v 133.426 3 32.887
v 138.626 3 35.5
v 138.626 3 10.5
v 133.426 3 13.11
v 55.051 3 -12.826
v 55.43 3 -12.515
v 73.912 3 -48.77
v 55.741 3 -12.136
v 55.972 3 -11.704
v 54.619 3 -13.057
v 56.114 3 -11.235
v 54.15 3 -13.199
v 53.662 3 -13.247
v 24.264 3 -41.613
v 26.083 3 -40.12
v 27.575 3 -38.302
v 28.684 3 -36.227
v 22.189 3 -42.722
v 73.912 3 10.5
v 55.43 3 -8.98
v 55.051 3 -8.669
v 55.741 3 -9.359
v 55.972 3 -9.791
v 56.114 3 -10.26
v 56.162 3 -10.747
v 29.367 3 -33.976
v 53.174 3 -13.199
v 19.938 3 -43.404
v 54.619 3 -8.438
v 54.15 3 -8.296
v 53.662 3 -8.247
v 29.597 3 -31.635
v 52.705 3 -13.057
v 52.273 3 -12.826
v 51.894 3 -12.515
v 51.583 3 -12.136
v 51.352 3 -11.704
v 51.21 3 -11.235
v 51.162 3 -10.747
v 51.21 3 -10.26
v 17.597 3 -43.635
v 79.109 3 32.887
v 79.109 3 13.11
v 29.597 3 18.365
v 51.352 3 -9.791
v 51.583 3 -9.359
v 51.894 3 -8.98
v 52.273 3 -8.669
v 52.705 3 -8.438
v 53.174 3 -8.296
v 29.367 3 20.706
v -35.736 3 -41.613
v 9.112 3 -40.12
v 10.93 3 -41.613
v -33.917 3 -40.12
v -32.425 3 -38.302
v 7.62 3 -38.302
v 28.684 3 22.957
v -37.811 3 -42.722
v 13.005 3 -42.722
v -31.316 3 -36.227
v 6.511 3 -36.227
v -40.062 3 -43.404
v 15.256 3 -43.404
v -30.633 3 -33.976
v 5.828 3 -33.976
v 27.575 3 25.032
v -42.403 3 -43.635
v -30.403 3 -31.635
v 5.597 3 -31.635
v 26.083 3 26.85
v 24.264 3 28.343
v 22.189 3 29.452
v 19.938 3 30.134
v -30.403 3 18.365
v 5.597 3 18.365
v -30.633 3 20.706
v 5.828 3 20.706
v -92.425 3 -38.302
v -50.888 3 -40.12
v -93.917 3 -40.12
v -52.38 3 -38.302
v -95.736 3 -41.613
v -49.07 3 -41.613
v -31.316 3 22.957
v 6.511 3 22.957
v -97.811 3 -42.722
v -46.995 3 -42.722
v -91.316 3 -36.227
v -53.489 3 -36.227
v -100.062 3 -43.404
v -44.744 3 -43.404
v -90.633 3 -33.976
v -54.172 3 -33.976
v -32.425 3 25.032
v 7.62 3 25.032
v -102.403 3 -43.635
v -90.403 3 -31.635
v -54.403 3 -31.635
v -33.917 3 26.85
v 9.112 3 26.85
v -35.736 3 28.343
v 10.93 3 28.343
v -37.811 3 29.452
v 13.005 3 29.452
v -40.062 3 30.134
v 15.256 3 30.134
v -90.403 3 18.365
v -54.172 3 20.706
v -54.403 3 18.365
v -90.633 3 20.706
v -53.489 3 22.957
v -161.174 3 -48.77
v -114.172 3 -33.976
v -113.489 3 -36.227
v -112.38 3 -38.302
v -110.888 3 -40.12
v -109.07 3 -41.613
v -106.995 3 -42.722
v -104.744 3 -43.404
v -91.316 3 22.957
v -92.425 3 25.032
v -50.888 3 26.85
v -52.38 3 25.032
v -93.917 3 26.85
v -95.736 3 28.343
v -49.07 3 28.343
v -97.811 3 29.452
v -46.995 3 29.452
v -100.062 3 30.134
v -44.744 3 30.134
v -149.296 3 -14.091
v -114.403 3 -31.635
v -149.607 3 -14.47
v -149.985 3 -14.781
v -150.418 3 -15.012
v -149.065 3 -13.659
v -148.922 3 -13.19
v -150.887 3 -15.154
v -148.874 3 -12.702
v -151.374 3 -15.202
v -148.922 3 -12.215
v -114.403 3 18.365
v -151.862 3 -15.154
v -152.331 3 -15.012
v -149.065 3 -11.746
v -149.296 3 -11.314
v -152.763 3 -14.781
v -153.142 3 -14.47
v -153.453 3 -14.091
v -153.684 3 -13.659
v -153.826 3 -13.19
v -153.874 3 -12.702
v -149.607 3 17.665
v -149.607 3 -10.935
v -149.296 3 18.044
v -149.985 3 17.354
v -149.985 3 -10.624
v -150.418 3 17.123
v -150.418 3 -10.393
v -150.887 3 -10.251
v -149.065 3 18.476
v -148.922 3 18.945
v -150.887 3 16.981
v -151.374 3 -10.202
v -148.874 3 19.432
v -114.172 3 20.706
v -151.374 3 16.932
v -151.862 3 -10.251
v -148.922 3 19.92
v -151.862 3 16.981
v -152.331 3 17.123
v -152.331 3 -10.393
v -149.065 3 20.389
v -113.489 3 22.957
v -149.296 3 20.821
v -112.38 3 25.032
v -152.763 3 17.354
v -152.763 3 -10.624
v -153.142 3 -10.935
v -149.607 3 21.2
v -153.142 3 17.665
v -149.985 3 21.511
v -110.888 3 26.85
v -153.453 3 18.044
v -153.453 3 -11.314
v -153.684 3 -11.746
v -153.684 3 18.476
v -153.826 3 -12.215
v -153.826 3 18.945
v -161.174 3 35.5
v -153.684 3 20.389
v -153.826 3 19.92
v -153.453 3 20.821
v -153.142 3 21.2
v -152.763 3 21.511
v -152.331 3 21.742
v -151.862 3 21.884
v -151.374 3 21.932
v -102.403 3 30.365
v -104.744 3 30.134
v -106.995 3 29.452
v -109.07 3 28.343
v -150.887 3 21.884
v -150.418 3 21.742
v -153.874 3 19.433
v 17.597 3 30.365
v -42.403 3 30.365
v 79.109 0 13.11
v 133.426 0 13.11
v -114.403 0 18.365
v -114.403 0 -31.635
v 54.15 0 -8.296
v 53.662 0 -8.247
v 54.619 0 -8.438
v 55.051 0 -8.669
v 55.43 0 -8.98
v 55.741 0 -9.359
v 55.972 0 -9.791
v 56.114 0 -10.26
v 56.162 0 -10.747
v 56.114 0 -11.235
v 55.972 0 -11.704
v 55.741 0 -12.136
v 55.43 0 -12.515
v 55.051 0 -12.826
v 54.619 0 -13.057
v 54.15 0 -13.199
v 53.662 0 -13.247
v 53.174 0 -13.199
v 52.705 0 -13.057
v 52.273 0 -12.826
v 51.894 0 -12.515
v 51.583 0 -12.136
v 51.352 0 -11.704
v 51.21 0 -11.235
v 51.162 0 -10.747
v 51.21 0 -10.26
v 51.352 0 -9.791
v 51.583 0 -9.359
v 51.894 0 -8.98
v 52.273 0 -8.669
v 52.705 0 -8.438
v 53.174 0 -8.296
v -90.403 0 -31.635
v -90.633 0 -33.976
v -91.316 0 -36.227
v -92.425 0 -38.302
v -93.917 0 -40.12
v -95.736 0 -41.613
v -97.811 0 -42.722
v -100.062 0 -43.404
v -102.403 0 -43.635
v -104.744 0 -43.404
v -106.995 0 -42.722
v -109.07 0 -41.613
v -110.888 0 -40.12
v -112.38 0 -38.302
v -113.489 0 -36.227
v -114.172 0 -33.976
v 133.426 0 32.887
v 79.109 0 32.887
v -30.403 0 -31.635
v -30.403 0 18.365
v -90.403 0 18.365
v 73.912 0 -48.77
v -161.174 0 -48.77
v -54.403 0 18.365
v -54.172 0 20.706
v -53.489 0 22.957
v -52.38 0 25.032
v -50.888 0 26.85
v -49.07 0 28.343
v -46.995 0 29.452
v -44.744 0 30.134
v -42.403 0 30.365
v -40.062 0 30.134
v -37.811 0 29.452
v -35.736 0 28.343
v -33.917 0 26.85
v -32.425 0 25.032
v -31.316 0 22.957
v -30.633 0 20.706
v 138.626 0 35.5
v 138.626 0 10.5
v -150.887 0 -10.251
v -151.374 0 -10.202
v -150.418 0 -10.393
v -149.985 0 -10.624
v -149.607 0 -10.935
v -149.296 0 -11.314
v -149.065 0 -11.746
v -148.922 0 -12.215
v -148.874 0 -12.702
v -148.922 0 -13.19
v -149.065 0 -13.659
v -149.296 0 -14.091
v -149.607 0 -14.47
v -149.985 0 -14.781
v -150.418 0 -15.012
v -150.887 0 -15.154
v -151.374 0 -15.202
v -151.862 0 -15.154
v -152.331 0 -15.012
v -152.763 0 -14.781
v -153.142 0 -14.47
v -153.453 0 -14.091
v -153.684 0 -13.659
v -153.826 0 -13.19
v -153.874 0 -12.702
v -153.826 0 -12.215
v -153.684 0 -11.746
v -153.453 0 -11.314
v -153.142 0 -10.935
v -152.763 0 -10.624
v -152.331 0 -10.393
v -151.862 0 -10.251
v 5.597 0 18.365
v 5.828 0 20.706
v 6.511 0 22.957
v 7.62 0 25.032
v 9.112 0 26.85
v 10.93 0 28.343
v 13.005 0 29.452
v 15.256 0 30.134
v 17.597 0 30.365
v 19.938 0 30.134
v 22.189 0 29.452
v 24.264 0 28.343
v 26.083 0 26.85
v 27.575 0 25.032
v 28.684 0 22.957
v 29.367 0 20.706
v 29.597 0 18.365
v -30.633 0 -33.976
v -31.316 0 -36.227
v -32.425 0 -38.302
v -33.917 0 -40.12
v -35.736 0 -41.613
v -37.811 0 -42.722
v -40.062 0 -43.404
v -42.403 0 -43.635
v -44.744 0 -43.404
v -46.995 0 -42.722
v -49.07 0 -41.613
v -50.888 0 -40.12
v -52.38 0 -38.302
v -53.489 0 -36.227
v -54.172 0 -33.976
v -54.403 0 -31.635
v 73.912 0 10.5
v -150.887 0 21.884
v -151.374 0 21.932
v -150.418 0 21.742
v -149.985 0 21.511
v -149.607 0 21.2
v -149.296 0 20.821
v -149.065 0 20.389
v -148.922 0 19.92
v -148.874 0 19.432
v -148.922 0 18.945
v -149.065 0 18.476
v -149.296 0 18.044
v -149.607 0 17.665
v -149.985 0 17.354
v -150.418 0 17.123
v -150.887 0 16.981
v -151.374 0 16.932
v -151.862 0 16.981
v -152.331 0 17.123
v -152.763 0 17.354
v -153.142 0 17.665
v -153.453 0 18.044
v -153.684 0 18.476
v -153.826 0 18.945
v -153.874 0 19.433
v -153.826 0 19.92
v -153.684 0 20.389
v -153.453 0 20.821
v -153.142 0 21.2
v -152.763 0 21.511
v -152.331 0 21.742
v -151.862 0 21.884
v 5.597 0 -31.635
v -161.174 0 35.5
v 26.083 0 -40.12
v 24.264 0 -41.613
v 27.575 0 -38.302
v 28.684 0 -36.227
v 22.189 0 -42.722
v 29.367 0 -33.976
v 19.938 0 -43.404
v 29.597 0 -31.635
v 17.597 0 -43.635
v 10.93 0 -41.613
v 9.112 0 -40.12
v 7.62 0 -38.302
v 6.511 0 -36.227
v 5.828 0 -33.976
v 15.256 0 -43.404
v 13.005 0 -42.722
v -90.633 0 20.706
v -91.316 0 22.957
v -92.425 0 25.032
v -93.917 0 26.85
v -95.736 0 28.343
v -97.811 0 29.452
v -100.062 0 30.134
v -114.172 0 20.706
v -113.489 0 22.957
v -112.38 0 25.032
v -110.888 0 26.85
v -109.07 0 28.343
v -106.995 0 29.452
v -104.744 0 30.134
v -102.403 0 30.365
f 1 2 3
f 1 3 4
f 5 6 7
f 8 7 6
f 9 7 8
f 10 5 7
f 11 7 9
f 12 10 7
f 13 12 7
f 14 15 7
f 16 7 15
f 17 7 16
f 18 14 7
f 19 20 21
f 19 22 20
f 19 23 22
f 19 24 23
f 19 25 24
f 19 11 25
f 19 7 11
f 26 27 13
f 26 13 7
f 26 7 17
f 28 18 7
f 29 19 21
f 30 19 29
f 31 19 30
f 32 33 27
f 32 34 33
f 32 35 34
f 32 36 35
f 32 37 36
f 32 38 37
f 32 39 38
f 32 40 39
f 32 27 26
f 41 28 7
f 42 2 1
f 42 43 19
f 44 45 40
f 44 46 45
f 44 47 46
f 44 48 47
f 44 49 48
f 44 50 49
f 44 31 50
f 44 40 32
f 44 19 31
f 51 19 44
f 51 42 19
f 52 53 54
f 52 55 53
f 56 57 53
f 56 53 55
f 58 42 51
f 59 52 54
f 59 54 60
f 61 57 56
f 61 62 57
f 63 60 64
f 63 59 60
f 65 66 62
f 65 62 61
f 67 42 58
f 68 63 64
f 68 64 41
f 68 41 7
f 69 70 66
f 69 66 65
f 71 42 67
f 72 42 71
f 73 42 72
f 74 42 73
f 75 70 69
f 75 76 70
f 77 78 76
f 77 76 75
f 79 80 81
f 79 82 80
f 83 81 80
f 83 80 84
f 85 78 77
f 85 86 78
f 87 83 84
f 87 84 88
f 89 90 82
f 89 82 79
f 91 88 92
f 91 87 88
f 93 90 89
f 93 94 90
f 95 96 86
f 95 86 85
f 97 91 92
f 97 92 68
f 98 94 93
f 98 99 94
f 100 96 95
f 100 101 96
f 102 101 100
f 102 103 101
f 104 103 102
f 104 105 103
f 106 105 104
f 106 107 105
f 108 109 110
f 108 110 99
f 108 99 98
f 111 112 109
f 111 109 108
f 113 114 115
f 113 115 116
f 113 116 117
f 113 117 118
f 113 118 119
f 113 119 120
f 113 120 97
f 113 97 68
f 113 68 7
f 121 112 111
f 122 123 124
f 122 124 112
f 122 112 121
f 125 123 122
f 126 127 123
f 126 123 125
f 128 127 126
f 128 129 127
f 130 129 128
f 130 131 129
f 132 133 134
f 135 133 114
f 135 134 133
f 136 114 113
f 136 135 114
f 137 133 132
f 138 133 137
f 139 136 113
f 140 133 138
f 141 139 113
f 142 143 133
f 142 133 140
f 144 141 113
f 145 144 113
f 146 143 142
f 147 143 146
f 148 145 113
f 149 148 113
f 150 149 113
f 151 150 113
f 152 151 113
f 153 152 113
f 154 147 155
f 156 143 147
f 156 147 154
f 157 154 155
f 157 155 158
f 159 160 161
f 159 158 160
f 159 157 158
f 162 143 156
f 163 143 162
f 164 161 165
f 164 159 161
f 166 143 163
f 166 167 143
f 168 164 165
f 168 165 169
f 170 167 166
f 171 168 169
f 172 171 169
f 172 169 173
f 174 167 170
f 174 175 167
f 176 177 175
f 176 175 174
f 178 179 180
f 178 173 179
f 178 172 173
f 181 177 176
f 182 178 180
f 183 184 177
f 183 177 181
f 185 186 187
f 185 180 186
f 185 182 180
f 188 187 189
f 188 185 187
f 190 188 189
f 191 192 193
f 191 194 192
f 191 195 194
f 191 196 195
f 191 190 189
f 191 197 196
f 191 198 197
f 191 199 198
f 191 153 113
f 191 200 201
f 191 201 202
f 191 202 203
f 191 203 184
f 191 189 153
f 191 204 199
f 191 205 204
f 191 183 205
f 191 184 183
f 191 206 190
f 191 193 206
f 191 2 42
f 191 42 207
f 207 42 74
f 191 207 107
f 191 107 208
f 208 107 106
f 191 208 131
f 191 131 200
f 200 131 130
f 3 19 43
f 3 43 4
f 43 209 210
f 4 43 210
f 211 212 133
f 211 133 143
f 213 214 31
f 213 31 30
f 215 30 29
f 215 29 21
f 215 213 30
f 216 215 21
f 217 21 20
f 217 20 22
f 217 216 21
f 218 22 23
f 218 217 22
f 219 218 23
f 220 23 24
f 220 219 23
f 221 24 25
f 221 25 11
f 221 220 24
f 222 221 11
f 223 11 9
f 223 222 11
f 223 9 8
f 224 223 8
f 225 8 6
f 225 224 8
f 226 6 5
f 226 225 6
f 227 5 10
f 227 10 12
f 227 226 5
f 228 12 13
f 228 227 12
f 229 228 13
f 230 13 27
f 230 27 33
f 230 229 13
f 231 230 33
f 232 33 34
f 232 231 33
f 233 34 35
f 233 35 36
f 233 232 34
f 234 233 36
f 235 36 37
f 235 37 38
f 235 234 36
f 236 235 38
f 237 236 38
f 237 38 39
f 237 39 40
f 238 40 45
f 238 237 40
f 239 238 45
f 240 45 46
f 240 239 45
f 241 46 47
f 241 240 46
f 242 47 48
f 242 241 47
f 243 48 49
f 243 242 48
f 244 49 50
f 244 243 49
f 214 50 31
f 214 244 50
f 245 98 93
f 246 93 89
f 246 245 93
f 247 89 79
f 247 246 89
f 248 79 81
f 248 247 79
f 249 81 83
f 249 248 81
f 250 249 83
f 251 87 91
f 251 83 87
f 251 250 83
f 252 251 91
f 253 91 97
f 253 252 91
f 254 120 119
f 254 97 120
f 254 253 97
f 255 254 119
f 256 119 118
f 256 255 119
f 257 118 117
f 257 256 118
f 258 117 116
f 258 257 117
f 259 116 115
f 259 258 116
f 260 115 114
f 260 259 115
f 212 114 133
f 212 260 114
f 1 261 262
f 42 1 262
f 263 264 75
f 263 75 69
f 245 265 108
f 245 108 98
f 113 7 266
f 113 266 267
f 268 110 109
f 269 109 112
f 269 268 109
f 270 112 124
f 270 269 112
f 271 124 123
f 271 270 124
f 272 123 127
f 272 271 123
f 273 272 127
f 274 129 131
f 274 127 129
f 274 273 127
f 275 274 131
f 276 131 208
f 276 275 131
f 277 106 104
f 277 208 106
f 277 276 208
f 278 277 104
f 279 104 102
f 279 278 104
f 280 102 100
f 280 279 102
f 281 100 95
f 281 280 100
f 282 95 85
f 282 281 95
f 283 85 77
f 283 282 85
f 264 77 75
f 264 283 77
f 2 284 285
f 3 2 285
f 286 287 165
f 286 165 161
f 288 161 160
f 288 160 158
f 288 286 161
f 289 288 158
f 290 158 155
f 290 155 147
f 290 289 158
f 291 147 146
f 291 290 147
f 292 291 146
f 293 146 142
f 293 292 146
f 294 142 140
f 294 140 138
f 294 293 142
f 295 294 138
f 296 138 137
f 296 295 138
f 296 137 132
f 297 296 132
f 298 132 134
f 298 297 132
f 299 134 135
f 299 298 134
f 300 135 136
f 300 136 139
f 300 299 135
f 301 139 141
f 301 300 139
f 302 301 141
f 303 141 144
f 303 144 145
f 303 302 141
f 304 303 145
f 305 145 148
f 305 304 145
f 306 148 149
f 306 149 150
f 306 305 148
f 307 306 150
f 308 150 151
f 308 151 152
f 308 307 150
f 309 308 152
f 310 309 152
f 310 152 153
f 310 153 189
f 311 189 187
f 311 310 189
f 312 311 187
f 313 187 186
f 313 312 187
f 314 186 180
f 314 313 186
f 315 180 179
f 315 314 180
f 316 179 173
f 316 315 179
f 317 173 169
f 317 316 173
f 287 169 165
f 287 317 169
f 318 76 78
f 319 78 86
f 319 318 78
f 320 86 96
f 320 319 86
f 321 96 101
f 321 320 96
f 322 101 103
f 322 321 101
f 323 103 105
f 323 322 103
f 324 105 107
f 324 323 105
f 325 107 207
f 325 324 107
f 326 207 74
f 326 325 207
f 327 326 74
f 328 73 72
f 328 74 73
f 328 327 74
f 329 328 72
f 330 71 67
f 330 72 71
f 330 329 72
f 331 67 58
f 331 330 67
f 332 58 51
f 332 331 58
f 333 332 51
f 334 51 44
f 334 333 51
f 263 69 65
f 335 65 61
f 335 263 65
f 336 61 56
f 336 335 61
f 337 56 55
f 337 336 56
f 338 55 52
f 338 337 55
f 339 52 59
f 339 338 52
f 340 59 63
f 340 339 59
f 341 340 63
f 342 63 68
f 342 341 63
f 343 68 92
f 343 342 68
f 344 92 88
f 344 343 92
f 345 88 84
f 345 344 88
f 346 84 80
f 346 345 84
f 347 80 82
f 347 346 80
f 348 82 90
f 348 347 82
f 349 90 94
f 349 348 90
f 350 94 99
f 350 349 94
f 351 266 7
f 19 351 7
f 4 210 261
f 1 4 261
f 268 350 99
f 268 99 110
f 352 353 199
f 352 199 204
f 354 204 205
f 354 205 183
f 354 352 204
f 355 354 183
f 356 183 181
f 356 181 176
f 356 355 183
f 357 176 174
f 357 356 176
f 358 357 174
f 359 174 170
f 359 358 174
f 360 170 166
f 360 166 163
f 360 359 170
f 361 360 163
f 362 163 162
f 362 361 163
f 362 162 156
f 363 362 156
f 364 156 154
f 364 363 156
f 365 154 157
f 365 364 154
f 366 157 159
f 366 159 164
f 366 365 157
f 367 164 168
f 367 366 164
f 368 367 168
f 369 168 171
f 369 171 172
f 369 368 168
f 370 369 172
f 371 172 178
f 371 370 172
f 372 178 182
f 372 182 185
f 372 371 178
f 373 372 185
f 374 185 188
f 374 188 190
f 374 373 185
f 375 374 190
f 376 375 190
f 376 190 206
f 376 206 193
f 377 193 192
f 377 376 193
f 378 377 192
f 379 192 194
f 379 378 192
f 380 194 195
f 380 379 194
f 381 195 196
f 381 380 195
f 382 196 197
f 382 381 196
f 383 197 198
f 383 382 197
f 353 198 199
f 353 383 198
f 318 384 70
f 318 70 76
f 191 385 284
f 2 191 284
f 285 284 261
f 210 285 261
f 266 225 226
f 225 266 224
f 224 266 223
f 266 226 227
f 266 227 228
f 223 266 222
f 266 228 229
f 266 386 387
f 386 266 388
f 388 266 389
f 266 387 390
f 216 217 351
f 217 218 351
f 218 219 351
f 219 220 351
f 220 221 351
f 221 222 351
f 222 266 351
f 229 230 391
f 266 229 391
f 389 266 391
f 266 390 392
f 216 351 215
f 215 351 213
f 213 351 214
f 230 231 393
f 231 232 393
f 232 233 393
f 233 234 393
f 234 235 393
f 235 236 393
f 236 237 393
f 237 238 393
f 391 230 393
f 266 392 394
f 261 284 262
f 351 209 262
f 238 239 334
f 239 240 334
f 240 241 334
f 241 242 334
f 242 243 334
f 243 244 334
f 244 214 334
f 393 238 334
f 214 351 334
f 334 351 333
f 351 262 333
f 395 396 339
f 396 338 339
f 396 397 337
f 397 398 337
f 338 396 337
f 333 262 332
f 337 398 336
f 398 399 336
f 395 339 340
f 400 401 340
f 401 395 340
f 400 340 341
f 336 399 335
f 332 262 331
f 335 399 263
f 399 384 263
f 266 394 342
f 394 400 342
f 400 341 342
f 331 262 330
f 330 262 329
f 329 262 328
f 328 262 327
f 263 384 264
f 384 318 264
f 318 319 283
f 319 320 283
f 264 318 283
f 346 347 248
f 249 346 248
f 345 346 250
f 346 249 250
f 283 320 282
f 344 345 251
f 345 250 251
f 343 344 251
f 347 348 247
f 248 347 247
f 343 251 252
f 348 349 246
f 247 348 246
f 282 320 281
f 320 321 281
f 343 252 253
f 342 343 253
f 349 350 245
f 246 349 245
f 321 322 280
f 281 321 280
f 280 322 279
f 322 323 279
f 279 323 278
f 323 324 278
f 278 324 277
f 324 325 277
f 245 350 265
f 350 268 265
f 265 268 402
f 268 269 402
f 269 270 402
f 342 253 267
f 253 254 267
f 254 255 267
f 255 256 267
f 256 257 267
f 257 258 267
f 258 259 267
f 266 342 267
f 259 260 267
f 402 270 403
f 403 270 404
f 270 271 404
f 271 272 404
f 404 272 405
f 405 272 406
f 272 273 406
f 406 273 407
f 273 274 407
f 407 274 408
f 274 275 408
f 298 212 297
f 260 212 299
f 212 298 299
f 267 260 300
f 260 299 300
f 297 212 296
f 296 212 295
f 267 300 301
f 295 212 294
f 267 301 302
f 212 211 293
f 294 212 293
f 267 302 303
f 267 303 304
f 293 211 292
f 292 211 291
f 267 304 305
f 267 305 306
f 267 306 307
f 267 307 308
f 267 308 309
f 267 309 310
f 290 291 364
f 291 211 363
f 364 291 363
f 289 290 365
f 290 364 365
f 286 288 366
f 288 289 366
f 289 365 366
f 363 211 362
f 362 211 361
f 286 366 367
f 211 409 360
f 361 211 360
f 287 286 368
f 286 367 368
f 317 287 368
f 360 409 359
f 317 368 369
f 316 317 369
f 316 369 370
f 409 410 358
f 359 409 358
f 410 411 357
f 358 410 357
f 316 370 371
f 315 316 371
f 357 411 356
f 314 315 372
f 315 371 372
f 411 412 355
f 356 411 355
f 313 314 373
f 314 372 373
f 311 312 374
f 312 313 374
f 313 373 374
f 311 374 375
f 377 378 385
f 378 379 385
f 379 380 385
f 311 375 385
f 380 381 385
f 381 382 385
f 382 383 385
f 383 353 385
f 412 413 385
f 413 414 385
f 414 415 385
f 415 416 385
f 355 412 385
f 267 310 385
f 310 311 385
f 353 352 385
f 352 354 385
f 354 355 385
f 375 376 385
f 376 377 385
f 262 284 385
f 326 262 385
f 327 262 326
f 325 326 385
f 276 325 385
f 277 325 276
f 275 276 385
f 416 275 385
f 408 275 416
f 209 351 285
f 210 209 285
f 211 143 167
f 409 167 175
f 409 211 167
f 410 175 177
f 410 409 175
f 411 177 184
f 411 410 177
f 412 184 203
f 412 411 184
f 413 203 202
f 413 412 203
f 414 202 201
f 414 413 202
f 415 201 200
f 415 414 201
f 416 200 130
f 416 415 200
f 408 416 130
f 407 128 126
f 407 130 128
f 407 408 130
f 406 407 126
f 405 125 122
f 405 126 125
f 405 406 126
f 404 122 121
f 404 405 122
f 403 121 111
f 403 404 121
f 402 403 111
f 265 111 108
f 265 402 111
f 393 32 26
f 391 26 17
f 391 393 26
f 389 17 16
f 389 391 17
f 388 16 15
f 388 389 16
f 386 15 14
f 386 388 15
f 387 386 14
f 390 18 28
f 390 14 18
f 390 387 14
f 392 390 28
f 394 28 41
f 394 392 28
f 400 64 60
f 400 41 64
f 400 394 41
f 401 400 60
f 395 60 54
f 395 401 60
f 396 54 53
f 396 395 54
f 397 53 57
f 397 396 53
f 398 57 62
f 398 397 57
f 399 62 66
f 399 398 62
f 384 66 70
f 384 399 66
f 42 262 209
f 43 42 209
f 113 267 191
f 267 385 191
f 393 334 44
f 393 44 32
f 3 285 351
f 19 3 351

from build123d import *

# Parameters (mm, degrees)
ESQUISSE1_R             = 2.5
BOSS_EXTRU_1_DEPTH      = 3
ENL_V_MAT_EXTRU_1_DEPTH = 166.064843505
SKETCH1_W               = 235.08624341
SKETCH1_H               = 3
BOSS_EXTRUDE1_DEPTH     = 20
SKETCH2_W               = 54.316544192
SKETCH2_H               = 19.777044638
CUT_EXTRUDE1_DEPTH      = 10
CUT_EXTRUDE2_DEPTH      = 10


with BuildPart() as part:
    # Esquisse1 → Boss.-Extru.1 (new body)
    with BuildSketch(Plane(origin=(0, 0, 0), x_dir=(1, 0, 0), z_dir=(0, 1, 0))):
        Polygon((-161.174292495, 18.77), (-161.174292495, -25.5), (-161.174292495, -35.5), (138.625707505, -35.5), (138.625707505, -10.5), (73.911950915, -10.5), (73.911950915, 28.77), (-161.174292495, 28.77), align=None)
        with Locations(Location((-151.374292495, -19.4325, 0), (0, 0, 270))):
            Circle(ESQUISSE1_R, mode=Mode.SUBTRACT)
        with Locations(Location((-151.374292495, 12.7025, 0), (0, 0, 270))):
            Circle(ESQUISSE1_R, mode=Mode.SUBTRACT)
        with Locations(Location((53.661950915, 10.747499922, 0), (0, 0, 270))):
            Circle(ESQUISSE1_R, mode=Mode.SUBTRACT)
        Polygon((114.261515644, -15.687745544), (114.261515644, -18.634239014), (132.625707505, -18.634239014), (132.625707505, -32.887044638), (114.261515644, -32.887044638), (79.109163313, -32.887044638), (79.109163313, -15.687745544), align=None, mode=Mode.SUBTRACT)
    extrude(amount=BOSS_EXTRU_1_DEPTH)

    # Esquisse2 → Enlèv. mat.-Extru.1 (cut, through all)
    with BuildSketch(Plane.XZ):
        with BuildLine():
            Line((7.640390062, -11.635), (7.640390062, 18.365))
            ThreePointArc((7.640390062, 18.365), (15.140390062, 25.865), (22.640390062, 18.365))
            Line((22.640390062, 18.365), (22.640390062, -11.635))
            ThreePointArc((22.640390062, -11.635), (15.140390062, -19.135), (7.640390062, -11.635))
        make_face()
        with BuildLine():
            Line((-51.13117079, -11.635), (-51.13117079, 18.365))
            ThreePointArc((-51.13117079, 18.365), (-43.63117079, 25.865), (-36.13117079, 18.365))
            Line((-36.13117079, 18.365), (-36.13117079, -11.635))
            ThreePointArc((-36.13117079, -11.635), (-43.63117079, -19.135), (-51.13117079, -11.635))
        make_face()
        with BuildLine():
            Line((-109.902731643, -11.635), (-109.902731643, 18.365))
            ThreePointArc((-109.902731643, 18.365), (-102.402731643, 25.865), (-94.902731643, 18.365))
            Line((-94.902731643, 18.365), (-94.902731643, -11.635))
            ThreePointArc((-94.902731643, -11.635), (-102.402731643, -19.135), (-109.902731643, -11.635))
        make_face()
    extrude(amount=-ENL_V_MAT_EXTRU_1_DEPTH, mode=Mode.SUBTRACT)

    # Sketch1 → Boss-Extrude1 (add)
    with BuildSketch(Plane(origin=(0, 0, -28.77), x_dir=(-1, 0, 0), z_dir=(0, 0, -1))):
        with Locations((43.63117079, 1.5)):
            Rectangle(SKETCH1_W, SKETCH1_H)
    extrude(amount=BOSS_EXTRUDE1_DEPTH)

    # Sketch2 → Cut-Extrude1 (cut)
    with BuildSketch(Plane.XZ):
        with Locations((106.267435409, 22.998522319)):
            Rectangle(SKETCH2_W, SKETCH2_H)
    extrude(amount=-CUT_EXTRUDE1_DEPTH, mode=Mode.SUBTRACT)

    # Sketch3 → Cut-Extrude2 (cut)
    with BuildSketch(Plane(origin=(0, 0, 0), x_dir=(-1, 0, 0), z_dir=(0, -1, 0))):
        with BuildLine():
            Line((90.402731643, -18.365), (90.402731643, 31.635))
            ThreePointArc((90.402731643, 31.635), (102.402731643, 43.635), (114.402731643, 31.635))
            Line((114.402731643, 31.635), (114.402731643, -18.365))
            ThreePointArc((114.402731643, -18.365), (102.402731643, -30.365), (90.402731643, -18.365))
        make_face()
        with BuildLine():
            Line((30.402731643, -18.365), (30.402731643, 31.635))
            ThreePointArc((30.402731643, 31.635), (42.402731643, 43.635), (54.402731643, 31.635))
            Line((54.402731643, 31.635), (54.402731643, -18.365))
            ThreePointArc((54.402731643, -18.365), (42.402731643, -30.365), (30.402731643, -18.365))
        make_face()
        with BuildLine():
            Line((-29.597268357, -18.365), (-29.597268357, 31.635))
            ThreePointArc((-29.597268357, 31.635), (-17.597268357, 43.635), (-5.597268357, 31.635))
            Line((-5.597268357, 31.635), (-5.597268357, -18.365))
            ThreePointArc((-5.597268357, -18.365), (-17.597268357, -30.365), (-29.597268357, -18.365))
        make_face()
    extrude(amount=-CUT_EXTRUDE2_DEPTH, mode=Mode.SUBTRACT)


solid = part.part
